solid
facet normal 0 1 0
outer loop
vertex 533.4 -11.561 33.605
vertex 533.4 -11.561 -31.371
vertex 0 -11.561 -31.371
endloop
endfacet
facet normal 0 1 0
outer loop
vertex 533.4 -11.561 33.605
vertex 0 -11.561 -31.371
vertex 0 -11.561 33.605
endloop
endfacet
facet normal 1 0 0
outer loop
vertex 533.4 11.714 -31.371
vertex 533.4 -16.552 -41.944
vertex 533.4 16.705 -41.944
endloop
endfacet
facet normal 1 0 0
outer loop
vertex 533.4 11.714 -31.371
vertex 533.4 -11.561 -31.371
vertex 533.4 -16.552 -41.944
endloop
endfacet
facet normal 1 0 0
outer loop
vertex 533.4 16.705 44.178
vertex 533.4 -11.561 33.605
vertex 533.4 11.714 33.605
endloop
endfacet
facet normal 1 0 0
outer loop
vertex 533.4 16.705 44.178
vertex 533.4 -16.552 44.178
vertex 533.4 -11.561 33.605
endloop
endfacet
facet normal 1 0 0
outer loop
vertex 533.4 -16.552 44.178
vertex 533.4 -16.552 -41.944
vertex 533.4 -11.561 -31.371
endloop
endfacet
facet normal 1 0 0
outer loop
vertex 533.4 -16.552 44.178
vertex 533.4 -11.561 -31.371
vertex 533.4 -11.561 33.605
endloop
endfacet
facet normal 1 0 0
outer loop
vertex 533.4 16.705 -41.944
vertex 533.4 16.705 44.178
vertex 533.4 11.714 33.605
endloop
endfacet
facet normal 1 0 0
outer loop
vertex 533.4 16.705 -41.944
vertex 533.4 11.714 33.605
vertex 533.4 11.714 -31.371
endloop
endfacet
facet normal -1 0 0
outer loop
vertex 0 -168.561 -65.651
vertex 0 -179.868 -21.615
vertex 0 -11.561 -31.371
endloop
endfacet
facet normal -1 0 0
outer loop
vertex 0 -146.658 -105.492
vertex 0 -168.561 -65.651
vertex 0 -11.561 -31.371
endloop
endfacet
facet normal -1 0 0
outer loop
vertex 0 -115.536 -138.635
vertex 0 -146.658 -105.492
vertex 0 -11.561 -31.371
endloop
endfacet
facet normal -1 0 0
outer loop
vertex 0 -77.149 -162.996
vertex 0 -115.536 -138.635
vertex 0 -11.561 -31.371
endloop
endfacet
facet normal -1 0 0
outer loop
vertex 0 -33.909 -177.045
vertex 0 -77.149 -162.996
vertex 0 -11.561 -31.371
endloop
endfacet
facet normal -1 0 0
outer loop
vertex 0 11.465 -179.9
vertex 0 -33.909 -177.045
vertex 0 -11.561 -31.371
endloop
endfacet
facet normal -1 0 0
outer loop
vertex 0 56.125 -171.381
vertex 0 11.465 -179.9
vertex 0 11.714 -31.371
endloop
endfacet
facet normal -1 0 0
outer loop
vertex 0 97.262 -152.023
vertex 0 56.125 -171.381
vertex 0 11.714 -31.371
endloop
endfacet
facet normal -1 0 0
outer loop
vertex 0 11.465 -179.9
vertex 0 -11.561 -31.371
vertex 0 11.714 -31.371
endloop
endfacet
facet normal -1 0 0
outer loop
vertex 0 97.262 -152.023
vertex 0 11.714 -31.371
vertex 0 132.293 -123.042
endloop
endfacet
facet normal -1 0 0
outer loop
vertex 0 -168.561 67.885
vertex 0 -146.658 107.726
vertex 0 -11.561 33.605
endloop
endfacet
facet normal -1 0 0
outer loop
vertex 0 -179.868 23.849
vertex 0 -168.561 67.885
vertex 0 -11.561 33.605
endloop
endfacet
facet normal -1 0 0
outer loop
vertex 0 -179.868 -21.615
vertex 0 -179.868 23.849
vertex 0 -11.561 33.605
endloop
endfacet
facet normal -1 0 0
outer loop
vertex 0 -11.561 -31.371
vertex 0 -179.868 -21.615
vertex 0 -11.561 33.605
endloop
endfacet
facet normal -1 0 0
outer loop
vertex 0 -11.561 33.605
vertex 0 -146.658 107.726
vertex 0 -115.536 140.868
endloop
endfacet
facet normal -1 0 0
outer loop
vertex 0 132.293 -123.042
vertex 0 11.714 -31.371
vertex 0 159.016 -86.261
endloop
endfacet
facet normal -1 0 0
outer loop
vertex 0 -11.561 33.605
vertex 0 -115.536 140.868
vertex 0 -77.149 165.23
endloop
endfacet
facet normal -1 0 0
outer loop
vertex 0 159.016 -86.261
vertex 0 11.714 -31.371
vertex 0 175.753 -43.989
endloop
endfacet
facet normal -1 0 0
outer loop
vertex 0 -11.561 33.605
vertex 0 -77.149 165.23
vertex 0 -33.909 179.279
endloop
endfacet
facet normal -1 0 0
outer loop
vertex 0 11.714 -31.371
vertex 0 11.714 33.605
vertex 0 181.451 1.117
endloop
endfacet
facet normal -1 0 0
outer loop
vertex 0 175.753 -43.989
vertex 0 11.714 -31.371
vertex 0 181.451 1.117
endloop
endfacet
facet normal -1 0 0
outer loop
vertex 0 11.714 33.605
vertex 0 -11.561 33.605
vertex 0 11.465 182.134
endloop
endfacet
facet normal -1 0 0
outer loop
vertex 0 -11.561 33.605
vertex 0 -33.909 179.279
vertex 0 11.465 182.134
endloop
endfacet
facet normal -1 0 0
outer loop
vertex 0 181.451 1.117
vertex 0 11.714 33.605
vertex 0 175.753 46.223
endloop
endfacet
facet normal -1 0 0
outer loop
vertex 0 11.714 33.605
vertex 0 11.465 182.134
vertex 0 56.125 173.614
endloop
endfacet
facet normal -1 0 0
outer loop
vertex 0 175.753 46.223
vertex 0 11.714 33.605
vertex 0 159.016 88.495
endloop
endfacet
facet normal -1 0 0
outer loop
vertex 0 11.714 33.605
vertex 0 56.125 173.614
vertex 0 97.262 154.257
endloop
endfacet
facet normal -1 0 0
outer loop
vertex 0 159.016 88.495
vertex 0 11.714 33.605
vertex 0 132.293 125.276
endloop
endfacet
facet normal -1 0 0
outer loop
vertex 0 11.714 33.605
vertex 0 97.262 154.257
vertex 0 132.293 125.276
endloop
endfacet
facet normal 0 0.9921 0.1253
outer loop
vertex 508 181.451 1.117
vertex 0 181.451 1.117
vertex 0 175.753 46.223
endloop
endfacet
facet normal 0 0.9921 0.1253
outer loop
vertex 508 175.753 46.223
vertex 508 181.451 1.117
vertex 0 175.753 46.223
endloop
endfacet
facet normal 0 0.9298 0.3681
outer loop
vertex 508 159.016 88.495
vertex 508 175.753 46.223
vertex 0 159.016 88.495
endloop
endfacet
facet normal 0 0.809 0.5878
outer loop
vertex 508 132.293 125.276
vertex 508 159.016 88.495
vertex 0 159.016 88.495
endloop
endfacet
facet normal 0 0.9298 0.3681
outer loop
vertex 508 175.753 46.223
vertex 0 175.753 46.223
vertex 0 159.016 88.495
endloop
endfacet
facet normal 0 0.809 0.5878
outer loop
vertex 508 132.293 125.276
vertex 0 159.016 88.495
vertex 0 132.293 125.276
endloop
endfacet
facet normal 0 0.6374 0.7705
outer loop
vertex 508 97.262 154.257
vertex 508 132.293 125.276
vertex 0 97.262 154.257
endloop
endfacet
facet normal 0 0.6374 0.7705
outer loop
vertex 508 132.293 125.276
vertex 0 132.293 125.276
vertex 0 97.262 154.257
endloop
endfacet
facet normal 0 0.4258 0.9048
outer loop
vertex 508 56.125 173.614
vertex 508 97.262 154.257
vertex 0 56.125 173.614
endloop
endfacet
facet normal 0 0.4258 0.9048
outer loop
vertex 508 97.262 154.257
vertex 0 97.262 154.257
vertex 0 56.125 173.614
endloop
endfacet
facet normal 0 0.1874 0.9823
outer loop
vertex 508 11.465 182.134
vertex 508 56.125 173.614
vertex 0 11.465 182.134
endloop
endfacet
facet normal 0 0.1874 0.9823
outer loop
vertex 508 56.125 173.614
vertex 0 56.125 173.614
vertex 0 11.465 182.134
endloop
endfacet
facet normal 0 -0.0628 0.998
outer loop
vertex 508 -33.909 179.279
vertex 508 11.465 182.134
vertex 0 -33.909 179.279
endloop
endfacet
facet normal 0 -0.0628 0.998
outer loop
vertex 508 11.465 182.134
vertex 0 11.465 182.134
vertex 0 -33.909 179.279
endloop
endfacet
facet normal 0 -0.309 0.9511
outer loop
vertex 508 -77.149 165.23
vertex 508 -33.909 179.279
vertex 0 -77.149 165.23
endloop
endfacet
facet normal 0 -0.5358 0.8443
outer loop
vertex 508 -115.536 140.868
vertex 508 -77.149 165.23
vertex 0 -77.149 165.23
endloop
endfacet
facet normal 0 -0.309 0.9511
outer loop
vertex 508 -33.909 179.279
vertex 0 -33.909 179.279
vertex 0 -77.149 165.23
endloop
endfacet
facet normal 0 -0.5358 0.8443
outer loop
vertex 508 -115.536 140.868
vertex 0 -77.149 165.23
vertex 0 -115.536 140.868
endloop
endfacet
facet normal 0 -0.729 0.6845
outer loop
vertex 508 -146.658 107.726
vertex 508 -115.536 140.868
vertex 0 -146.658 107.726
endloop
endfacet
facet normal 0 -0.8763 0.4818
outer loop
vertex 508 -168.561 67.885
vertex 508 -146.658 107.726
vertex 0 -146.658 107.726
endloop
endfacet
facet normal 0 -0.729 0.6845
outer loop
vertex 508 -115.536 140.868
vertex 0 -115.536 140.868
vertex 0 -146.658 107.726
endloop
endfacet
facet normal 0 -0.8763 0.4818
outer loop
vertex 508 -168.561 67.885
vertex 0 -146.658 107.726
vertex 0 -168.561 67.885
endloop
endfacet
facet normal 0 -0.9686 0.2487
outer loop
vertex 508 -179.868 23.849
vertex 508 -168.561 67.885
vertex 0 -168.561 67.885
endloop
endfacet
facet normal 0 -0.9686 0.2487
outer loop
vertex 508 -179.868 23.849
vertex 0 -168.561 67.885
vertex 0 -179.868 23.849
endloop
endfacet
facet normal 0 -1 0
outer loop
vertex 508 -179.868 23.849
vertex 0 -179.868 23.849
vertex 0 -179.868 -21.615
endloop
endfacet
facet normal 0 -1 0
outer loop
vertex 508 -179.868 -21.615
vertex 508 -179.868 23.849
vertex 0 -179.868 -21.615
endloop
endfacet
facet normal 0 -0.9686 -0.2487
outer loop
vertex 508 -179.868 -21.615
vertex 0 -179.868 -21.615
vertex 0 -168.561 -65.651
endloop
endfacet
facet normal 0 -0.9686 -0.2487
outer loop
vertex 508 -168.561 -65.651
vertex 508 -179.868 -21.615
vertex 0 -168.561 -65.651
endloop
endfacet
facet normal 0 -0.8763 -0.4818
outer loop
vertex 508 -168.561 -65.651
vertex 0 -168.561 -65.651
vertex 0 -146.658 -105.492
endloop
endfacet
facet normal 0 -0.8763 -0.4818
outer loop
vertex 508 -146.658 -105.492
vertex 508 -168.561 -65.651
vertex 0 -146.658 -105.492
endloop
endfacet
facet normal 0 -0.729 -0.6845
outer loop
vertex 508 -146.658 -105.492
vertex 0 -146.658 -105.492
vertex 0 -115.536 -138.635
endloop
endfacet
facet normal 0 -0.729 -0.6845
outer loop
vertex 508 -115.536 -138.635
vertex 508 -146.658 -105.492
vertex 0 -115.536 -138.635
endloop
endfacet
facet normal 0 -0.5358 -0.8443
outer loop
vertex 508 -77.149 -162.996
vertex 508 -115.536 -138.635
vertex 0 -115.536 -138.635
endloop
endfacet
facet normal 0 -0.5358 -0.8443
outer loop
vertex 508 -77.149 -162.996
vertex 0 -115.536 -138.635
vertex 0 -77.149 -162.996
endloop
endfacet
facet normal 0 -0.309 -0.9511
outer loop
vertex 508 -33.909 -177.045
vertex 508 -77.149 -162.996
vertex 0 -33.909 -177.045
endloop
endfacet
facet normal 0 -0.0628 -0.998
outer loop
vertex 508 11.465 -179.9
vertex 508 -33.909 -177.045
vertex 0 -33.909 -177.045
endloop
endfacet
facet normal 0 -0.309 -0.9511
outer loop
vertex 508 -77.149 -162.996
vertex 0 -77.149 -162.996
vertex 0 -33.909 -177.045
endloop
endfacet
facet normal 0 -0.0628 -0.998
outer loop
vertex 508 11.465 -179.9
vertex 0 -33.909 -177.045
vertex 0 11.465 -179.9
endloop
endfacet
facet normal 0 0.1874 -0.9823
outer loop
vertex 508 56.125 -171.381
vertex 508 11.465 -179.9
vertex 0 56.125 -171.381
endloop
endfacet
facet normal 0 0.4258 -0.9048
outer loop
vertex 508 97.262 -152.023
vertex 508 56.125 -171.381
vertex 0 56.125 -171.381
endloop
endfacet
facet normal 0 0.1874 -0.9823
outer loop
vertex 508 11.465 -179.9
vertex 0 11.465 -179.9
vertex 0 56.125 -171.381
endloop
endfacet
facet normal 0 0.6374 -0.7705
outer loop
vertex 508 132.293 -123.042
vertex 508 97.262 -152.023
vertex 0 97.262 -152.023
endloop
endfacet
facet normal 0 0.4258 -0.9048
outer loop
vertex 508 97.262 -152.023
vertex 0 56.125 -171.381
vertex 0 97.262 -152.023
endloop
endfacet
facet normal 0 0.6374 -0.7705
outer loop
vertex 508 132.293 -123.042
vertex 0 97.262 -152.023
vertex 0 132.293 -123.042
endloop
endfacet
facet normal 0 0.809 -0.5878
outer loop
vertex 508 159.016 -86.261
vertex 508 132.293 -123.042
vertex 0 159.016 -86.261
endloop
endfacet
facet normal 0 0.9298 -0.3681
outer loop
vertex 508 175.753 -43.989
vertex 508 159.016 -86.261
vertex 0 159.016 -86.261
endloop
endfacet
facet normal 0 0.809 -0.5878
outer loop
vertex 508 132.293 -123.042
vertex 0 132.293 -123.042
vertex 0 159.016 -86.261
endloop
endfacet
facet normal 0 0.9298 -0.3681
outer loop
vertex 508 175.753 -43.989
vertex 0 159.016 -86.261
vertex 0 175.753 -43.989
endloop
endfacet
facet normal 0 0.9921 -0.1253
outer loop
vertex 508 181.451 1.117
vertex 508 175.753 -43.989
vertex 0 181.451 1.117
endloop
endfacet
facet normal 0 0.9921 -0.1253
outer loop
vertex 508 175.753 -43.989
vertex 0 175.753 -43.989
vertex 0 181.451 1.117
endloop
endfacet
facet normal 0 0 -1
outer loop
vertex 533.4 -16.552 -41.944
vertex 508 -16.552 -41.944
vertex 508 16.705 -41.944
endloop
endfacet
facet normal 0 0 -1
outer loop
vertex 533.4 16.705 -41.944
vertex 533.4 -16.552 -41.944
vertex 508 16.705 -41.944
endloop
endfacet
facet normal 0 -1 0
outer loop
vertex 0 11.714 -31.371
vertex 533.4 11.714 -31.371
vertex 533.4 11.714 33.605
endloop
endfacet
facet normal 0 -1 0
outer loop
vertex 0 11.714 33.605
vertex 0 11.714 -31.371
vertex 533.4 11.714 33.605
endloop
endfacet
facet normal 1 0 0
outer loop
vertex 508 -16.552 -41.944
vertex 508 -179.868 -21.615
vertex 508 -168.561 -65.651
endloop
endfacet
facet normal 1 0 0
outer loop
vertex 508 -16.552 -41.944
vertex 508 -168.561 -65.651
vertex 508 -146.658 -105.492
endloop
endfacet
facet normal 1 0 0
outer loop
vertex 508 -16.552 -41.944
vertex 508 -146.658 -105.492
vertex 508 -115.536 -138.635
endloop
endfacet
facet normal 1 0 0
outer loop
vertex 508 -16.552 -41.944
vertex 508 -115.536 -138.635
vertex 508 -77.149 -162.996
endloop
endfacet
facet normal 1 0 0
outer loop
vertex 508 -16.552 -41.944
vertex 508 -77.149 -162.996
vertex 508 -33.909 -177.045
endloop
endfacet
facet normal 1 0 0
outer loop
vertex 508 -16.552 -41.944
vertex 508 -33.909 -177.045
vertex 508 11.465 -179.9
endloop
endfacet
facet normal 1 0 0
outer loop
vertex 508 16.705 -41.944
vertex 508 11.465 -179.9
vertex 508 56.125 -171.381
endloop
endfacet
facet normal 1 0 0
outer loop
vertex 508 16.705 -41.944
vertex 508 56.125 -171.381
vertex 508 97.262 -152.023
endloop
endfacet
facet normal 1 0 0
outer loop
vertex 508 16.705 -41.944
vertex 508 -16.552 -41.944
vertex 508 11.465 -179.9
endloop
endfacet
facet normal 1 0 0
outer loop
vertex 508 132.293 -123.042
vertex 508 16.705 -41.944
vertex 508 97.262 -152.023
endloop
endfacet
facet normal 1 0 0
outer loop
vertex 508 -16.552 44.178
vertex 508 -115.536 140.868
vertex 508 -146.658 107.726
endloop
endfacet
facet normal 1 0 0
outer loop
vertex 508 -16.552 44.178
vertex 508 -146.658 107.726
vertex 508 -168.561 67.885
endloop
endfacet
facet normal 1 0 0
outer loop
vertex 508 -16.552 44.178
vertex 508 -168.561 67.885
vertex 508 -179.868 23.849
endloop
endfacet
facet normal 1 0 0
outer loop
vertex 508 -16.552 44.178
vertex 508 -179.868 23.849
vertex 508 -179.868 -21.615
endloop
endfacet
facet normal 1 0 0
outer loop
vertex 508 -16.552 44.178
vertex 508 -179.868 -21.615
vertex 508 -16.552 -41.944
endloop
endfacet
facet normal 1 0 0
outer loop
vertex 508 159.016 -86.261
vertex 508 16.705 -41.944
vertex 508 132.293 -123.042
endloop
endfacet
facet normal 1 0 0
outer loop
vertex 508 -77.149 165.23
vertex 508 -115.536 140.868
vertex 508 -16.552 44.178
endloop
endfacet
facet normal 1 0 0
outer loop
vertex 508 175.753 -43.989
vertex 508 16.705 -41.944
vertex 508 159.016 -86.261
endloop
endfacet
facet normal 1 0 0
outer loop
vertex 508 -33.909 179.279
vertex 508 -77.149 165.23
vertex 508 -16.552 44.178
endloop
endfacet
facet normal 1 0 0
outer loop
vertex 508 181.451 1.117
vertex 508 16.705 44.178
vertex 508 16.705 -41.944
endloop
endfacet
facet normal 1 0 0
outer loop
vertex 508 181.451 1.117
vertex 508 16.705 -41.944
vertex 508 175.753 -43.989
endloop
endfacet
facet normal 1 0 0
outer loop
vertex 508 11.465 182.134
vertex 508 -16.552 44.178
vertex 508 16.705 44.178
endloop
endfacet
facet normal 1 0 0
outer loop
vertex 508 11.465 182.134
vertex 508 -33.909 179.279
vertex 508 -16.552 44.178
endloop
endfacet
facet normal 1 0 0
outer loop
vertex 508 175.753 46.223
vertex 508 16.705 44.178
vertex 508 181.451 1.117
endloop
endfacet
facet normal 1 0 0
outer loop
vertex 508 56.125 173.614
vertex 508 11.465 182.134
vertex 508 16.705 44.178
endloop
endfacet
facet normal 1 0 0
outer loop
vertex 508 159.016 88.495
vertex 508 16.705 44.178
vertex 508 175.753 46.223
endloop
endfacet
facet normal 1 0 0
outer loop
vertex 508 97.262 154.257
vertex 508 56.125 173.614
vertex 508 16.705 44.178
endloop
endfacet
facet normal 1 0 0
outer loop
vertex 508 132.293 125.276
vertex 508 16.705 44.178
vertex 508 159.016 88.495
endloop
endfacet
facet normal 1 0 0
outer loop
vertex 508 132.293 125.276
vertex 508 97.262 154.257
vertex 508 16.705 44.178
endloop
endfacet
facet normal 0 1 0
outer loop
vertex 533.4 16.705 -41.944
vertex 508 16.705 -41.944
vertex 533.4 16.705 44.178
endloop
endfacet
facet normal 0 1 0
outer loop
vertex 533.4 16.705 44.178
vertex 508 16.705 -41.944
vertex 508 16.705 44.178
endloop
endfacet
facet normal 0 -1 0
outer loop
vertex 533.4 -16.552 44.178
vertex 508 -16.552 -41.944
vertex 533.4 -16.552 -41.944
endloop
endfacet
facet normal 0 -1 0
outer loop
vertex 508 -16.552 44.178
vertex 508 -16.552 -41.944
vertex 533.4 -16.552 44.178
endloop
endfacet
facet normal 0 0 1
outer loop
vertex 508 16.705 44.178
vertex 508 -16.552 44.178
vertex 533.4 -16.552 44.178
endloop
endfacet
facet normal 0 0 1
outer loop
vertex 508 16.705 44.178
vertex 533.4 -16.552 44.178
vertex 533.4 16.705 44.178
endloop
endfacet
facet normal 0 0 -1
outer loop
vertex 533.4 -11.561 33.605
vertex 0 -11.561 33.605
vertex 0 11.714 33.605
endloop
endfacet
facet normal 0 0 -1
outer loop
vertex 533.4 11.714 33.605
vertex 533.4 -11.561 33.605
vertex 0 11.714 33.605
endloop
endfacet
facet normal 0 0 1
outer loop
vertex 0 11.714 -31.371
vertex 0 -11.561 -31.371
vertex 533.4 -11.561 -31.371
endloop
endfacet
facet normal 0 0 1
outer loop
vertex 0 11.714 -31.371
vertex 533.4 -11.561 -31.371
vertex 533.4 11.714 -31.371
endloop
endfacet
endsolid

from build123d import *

# Parameters (mm, degrees)
F0_W     = 33.256879
F0_H     = 86.122798
F0_W_2   = 23.275094
F0_H_2   = 64.976308
F1_DEPTH = 533.4
F0_R     = 181.374578
F2_DEPTH = 508


with BuildPart() as f1:
    # F0 (on Right) → F1 (new body)
    with BuildSketch(Plane.YZ):
        with Locations((0.07674, 1.116945)):
            Rectangle(F0_W, F0_H)
        with Locations((0.07674, 1.116945)):
            Rectangle(F0_W_2, F0_H_2, mode=Mode.SUBTRACT)
    extrude(amount=F1_DEPTH)

    # F0 (on Right) → F2 (join)
    with BuildSketch(Plane.YZ):
        with Locations((0.07674, 1.116945)):
            Circle(F0_R)
        with Locations((0.07674, 1.116945)):
            Rectangle(F0_W, F0_H, mode=Mode.SUBTRACT)
    extrude(amount=F2_DEPTH)


solid = f1.part
